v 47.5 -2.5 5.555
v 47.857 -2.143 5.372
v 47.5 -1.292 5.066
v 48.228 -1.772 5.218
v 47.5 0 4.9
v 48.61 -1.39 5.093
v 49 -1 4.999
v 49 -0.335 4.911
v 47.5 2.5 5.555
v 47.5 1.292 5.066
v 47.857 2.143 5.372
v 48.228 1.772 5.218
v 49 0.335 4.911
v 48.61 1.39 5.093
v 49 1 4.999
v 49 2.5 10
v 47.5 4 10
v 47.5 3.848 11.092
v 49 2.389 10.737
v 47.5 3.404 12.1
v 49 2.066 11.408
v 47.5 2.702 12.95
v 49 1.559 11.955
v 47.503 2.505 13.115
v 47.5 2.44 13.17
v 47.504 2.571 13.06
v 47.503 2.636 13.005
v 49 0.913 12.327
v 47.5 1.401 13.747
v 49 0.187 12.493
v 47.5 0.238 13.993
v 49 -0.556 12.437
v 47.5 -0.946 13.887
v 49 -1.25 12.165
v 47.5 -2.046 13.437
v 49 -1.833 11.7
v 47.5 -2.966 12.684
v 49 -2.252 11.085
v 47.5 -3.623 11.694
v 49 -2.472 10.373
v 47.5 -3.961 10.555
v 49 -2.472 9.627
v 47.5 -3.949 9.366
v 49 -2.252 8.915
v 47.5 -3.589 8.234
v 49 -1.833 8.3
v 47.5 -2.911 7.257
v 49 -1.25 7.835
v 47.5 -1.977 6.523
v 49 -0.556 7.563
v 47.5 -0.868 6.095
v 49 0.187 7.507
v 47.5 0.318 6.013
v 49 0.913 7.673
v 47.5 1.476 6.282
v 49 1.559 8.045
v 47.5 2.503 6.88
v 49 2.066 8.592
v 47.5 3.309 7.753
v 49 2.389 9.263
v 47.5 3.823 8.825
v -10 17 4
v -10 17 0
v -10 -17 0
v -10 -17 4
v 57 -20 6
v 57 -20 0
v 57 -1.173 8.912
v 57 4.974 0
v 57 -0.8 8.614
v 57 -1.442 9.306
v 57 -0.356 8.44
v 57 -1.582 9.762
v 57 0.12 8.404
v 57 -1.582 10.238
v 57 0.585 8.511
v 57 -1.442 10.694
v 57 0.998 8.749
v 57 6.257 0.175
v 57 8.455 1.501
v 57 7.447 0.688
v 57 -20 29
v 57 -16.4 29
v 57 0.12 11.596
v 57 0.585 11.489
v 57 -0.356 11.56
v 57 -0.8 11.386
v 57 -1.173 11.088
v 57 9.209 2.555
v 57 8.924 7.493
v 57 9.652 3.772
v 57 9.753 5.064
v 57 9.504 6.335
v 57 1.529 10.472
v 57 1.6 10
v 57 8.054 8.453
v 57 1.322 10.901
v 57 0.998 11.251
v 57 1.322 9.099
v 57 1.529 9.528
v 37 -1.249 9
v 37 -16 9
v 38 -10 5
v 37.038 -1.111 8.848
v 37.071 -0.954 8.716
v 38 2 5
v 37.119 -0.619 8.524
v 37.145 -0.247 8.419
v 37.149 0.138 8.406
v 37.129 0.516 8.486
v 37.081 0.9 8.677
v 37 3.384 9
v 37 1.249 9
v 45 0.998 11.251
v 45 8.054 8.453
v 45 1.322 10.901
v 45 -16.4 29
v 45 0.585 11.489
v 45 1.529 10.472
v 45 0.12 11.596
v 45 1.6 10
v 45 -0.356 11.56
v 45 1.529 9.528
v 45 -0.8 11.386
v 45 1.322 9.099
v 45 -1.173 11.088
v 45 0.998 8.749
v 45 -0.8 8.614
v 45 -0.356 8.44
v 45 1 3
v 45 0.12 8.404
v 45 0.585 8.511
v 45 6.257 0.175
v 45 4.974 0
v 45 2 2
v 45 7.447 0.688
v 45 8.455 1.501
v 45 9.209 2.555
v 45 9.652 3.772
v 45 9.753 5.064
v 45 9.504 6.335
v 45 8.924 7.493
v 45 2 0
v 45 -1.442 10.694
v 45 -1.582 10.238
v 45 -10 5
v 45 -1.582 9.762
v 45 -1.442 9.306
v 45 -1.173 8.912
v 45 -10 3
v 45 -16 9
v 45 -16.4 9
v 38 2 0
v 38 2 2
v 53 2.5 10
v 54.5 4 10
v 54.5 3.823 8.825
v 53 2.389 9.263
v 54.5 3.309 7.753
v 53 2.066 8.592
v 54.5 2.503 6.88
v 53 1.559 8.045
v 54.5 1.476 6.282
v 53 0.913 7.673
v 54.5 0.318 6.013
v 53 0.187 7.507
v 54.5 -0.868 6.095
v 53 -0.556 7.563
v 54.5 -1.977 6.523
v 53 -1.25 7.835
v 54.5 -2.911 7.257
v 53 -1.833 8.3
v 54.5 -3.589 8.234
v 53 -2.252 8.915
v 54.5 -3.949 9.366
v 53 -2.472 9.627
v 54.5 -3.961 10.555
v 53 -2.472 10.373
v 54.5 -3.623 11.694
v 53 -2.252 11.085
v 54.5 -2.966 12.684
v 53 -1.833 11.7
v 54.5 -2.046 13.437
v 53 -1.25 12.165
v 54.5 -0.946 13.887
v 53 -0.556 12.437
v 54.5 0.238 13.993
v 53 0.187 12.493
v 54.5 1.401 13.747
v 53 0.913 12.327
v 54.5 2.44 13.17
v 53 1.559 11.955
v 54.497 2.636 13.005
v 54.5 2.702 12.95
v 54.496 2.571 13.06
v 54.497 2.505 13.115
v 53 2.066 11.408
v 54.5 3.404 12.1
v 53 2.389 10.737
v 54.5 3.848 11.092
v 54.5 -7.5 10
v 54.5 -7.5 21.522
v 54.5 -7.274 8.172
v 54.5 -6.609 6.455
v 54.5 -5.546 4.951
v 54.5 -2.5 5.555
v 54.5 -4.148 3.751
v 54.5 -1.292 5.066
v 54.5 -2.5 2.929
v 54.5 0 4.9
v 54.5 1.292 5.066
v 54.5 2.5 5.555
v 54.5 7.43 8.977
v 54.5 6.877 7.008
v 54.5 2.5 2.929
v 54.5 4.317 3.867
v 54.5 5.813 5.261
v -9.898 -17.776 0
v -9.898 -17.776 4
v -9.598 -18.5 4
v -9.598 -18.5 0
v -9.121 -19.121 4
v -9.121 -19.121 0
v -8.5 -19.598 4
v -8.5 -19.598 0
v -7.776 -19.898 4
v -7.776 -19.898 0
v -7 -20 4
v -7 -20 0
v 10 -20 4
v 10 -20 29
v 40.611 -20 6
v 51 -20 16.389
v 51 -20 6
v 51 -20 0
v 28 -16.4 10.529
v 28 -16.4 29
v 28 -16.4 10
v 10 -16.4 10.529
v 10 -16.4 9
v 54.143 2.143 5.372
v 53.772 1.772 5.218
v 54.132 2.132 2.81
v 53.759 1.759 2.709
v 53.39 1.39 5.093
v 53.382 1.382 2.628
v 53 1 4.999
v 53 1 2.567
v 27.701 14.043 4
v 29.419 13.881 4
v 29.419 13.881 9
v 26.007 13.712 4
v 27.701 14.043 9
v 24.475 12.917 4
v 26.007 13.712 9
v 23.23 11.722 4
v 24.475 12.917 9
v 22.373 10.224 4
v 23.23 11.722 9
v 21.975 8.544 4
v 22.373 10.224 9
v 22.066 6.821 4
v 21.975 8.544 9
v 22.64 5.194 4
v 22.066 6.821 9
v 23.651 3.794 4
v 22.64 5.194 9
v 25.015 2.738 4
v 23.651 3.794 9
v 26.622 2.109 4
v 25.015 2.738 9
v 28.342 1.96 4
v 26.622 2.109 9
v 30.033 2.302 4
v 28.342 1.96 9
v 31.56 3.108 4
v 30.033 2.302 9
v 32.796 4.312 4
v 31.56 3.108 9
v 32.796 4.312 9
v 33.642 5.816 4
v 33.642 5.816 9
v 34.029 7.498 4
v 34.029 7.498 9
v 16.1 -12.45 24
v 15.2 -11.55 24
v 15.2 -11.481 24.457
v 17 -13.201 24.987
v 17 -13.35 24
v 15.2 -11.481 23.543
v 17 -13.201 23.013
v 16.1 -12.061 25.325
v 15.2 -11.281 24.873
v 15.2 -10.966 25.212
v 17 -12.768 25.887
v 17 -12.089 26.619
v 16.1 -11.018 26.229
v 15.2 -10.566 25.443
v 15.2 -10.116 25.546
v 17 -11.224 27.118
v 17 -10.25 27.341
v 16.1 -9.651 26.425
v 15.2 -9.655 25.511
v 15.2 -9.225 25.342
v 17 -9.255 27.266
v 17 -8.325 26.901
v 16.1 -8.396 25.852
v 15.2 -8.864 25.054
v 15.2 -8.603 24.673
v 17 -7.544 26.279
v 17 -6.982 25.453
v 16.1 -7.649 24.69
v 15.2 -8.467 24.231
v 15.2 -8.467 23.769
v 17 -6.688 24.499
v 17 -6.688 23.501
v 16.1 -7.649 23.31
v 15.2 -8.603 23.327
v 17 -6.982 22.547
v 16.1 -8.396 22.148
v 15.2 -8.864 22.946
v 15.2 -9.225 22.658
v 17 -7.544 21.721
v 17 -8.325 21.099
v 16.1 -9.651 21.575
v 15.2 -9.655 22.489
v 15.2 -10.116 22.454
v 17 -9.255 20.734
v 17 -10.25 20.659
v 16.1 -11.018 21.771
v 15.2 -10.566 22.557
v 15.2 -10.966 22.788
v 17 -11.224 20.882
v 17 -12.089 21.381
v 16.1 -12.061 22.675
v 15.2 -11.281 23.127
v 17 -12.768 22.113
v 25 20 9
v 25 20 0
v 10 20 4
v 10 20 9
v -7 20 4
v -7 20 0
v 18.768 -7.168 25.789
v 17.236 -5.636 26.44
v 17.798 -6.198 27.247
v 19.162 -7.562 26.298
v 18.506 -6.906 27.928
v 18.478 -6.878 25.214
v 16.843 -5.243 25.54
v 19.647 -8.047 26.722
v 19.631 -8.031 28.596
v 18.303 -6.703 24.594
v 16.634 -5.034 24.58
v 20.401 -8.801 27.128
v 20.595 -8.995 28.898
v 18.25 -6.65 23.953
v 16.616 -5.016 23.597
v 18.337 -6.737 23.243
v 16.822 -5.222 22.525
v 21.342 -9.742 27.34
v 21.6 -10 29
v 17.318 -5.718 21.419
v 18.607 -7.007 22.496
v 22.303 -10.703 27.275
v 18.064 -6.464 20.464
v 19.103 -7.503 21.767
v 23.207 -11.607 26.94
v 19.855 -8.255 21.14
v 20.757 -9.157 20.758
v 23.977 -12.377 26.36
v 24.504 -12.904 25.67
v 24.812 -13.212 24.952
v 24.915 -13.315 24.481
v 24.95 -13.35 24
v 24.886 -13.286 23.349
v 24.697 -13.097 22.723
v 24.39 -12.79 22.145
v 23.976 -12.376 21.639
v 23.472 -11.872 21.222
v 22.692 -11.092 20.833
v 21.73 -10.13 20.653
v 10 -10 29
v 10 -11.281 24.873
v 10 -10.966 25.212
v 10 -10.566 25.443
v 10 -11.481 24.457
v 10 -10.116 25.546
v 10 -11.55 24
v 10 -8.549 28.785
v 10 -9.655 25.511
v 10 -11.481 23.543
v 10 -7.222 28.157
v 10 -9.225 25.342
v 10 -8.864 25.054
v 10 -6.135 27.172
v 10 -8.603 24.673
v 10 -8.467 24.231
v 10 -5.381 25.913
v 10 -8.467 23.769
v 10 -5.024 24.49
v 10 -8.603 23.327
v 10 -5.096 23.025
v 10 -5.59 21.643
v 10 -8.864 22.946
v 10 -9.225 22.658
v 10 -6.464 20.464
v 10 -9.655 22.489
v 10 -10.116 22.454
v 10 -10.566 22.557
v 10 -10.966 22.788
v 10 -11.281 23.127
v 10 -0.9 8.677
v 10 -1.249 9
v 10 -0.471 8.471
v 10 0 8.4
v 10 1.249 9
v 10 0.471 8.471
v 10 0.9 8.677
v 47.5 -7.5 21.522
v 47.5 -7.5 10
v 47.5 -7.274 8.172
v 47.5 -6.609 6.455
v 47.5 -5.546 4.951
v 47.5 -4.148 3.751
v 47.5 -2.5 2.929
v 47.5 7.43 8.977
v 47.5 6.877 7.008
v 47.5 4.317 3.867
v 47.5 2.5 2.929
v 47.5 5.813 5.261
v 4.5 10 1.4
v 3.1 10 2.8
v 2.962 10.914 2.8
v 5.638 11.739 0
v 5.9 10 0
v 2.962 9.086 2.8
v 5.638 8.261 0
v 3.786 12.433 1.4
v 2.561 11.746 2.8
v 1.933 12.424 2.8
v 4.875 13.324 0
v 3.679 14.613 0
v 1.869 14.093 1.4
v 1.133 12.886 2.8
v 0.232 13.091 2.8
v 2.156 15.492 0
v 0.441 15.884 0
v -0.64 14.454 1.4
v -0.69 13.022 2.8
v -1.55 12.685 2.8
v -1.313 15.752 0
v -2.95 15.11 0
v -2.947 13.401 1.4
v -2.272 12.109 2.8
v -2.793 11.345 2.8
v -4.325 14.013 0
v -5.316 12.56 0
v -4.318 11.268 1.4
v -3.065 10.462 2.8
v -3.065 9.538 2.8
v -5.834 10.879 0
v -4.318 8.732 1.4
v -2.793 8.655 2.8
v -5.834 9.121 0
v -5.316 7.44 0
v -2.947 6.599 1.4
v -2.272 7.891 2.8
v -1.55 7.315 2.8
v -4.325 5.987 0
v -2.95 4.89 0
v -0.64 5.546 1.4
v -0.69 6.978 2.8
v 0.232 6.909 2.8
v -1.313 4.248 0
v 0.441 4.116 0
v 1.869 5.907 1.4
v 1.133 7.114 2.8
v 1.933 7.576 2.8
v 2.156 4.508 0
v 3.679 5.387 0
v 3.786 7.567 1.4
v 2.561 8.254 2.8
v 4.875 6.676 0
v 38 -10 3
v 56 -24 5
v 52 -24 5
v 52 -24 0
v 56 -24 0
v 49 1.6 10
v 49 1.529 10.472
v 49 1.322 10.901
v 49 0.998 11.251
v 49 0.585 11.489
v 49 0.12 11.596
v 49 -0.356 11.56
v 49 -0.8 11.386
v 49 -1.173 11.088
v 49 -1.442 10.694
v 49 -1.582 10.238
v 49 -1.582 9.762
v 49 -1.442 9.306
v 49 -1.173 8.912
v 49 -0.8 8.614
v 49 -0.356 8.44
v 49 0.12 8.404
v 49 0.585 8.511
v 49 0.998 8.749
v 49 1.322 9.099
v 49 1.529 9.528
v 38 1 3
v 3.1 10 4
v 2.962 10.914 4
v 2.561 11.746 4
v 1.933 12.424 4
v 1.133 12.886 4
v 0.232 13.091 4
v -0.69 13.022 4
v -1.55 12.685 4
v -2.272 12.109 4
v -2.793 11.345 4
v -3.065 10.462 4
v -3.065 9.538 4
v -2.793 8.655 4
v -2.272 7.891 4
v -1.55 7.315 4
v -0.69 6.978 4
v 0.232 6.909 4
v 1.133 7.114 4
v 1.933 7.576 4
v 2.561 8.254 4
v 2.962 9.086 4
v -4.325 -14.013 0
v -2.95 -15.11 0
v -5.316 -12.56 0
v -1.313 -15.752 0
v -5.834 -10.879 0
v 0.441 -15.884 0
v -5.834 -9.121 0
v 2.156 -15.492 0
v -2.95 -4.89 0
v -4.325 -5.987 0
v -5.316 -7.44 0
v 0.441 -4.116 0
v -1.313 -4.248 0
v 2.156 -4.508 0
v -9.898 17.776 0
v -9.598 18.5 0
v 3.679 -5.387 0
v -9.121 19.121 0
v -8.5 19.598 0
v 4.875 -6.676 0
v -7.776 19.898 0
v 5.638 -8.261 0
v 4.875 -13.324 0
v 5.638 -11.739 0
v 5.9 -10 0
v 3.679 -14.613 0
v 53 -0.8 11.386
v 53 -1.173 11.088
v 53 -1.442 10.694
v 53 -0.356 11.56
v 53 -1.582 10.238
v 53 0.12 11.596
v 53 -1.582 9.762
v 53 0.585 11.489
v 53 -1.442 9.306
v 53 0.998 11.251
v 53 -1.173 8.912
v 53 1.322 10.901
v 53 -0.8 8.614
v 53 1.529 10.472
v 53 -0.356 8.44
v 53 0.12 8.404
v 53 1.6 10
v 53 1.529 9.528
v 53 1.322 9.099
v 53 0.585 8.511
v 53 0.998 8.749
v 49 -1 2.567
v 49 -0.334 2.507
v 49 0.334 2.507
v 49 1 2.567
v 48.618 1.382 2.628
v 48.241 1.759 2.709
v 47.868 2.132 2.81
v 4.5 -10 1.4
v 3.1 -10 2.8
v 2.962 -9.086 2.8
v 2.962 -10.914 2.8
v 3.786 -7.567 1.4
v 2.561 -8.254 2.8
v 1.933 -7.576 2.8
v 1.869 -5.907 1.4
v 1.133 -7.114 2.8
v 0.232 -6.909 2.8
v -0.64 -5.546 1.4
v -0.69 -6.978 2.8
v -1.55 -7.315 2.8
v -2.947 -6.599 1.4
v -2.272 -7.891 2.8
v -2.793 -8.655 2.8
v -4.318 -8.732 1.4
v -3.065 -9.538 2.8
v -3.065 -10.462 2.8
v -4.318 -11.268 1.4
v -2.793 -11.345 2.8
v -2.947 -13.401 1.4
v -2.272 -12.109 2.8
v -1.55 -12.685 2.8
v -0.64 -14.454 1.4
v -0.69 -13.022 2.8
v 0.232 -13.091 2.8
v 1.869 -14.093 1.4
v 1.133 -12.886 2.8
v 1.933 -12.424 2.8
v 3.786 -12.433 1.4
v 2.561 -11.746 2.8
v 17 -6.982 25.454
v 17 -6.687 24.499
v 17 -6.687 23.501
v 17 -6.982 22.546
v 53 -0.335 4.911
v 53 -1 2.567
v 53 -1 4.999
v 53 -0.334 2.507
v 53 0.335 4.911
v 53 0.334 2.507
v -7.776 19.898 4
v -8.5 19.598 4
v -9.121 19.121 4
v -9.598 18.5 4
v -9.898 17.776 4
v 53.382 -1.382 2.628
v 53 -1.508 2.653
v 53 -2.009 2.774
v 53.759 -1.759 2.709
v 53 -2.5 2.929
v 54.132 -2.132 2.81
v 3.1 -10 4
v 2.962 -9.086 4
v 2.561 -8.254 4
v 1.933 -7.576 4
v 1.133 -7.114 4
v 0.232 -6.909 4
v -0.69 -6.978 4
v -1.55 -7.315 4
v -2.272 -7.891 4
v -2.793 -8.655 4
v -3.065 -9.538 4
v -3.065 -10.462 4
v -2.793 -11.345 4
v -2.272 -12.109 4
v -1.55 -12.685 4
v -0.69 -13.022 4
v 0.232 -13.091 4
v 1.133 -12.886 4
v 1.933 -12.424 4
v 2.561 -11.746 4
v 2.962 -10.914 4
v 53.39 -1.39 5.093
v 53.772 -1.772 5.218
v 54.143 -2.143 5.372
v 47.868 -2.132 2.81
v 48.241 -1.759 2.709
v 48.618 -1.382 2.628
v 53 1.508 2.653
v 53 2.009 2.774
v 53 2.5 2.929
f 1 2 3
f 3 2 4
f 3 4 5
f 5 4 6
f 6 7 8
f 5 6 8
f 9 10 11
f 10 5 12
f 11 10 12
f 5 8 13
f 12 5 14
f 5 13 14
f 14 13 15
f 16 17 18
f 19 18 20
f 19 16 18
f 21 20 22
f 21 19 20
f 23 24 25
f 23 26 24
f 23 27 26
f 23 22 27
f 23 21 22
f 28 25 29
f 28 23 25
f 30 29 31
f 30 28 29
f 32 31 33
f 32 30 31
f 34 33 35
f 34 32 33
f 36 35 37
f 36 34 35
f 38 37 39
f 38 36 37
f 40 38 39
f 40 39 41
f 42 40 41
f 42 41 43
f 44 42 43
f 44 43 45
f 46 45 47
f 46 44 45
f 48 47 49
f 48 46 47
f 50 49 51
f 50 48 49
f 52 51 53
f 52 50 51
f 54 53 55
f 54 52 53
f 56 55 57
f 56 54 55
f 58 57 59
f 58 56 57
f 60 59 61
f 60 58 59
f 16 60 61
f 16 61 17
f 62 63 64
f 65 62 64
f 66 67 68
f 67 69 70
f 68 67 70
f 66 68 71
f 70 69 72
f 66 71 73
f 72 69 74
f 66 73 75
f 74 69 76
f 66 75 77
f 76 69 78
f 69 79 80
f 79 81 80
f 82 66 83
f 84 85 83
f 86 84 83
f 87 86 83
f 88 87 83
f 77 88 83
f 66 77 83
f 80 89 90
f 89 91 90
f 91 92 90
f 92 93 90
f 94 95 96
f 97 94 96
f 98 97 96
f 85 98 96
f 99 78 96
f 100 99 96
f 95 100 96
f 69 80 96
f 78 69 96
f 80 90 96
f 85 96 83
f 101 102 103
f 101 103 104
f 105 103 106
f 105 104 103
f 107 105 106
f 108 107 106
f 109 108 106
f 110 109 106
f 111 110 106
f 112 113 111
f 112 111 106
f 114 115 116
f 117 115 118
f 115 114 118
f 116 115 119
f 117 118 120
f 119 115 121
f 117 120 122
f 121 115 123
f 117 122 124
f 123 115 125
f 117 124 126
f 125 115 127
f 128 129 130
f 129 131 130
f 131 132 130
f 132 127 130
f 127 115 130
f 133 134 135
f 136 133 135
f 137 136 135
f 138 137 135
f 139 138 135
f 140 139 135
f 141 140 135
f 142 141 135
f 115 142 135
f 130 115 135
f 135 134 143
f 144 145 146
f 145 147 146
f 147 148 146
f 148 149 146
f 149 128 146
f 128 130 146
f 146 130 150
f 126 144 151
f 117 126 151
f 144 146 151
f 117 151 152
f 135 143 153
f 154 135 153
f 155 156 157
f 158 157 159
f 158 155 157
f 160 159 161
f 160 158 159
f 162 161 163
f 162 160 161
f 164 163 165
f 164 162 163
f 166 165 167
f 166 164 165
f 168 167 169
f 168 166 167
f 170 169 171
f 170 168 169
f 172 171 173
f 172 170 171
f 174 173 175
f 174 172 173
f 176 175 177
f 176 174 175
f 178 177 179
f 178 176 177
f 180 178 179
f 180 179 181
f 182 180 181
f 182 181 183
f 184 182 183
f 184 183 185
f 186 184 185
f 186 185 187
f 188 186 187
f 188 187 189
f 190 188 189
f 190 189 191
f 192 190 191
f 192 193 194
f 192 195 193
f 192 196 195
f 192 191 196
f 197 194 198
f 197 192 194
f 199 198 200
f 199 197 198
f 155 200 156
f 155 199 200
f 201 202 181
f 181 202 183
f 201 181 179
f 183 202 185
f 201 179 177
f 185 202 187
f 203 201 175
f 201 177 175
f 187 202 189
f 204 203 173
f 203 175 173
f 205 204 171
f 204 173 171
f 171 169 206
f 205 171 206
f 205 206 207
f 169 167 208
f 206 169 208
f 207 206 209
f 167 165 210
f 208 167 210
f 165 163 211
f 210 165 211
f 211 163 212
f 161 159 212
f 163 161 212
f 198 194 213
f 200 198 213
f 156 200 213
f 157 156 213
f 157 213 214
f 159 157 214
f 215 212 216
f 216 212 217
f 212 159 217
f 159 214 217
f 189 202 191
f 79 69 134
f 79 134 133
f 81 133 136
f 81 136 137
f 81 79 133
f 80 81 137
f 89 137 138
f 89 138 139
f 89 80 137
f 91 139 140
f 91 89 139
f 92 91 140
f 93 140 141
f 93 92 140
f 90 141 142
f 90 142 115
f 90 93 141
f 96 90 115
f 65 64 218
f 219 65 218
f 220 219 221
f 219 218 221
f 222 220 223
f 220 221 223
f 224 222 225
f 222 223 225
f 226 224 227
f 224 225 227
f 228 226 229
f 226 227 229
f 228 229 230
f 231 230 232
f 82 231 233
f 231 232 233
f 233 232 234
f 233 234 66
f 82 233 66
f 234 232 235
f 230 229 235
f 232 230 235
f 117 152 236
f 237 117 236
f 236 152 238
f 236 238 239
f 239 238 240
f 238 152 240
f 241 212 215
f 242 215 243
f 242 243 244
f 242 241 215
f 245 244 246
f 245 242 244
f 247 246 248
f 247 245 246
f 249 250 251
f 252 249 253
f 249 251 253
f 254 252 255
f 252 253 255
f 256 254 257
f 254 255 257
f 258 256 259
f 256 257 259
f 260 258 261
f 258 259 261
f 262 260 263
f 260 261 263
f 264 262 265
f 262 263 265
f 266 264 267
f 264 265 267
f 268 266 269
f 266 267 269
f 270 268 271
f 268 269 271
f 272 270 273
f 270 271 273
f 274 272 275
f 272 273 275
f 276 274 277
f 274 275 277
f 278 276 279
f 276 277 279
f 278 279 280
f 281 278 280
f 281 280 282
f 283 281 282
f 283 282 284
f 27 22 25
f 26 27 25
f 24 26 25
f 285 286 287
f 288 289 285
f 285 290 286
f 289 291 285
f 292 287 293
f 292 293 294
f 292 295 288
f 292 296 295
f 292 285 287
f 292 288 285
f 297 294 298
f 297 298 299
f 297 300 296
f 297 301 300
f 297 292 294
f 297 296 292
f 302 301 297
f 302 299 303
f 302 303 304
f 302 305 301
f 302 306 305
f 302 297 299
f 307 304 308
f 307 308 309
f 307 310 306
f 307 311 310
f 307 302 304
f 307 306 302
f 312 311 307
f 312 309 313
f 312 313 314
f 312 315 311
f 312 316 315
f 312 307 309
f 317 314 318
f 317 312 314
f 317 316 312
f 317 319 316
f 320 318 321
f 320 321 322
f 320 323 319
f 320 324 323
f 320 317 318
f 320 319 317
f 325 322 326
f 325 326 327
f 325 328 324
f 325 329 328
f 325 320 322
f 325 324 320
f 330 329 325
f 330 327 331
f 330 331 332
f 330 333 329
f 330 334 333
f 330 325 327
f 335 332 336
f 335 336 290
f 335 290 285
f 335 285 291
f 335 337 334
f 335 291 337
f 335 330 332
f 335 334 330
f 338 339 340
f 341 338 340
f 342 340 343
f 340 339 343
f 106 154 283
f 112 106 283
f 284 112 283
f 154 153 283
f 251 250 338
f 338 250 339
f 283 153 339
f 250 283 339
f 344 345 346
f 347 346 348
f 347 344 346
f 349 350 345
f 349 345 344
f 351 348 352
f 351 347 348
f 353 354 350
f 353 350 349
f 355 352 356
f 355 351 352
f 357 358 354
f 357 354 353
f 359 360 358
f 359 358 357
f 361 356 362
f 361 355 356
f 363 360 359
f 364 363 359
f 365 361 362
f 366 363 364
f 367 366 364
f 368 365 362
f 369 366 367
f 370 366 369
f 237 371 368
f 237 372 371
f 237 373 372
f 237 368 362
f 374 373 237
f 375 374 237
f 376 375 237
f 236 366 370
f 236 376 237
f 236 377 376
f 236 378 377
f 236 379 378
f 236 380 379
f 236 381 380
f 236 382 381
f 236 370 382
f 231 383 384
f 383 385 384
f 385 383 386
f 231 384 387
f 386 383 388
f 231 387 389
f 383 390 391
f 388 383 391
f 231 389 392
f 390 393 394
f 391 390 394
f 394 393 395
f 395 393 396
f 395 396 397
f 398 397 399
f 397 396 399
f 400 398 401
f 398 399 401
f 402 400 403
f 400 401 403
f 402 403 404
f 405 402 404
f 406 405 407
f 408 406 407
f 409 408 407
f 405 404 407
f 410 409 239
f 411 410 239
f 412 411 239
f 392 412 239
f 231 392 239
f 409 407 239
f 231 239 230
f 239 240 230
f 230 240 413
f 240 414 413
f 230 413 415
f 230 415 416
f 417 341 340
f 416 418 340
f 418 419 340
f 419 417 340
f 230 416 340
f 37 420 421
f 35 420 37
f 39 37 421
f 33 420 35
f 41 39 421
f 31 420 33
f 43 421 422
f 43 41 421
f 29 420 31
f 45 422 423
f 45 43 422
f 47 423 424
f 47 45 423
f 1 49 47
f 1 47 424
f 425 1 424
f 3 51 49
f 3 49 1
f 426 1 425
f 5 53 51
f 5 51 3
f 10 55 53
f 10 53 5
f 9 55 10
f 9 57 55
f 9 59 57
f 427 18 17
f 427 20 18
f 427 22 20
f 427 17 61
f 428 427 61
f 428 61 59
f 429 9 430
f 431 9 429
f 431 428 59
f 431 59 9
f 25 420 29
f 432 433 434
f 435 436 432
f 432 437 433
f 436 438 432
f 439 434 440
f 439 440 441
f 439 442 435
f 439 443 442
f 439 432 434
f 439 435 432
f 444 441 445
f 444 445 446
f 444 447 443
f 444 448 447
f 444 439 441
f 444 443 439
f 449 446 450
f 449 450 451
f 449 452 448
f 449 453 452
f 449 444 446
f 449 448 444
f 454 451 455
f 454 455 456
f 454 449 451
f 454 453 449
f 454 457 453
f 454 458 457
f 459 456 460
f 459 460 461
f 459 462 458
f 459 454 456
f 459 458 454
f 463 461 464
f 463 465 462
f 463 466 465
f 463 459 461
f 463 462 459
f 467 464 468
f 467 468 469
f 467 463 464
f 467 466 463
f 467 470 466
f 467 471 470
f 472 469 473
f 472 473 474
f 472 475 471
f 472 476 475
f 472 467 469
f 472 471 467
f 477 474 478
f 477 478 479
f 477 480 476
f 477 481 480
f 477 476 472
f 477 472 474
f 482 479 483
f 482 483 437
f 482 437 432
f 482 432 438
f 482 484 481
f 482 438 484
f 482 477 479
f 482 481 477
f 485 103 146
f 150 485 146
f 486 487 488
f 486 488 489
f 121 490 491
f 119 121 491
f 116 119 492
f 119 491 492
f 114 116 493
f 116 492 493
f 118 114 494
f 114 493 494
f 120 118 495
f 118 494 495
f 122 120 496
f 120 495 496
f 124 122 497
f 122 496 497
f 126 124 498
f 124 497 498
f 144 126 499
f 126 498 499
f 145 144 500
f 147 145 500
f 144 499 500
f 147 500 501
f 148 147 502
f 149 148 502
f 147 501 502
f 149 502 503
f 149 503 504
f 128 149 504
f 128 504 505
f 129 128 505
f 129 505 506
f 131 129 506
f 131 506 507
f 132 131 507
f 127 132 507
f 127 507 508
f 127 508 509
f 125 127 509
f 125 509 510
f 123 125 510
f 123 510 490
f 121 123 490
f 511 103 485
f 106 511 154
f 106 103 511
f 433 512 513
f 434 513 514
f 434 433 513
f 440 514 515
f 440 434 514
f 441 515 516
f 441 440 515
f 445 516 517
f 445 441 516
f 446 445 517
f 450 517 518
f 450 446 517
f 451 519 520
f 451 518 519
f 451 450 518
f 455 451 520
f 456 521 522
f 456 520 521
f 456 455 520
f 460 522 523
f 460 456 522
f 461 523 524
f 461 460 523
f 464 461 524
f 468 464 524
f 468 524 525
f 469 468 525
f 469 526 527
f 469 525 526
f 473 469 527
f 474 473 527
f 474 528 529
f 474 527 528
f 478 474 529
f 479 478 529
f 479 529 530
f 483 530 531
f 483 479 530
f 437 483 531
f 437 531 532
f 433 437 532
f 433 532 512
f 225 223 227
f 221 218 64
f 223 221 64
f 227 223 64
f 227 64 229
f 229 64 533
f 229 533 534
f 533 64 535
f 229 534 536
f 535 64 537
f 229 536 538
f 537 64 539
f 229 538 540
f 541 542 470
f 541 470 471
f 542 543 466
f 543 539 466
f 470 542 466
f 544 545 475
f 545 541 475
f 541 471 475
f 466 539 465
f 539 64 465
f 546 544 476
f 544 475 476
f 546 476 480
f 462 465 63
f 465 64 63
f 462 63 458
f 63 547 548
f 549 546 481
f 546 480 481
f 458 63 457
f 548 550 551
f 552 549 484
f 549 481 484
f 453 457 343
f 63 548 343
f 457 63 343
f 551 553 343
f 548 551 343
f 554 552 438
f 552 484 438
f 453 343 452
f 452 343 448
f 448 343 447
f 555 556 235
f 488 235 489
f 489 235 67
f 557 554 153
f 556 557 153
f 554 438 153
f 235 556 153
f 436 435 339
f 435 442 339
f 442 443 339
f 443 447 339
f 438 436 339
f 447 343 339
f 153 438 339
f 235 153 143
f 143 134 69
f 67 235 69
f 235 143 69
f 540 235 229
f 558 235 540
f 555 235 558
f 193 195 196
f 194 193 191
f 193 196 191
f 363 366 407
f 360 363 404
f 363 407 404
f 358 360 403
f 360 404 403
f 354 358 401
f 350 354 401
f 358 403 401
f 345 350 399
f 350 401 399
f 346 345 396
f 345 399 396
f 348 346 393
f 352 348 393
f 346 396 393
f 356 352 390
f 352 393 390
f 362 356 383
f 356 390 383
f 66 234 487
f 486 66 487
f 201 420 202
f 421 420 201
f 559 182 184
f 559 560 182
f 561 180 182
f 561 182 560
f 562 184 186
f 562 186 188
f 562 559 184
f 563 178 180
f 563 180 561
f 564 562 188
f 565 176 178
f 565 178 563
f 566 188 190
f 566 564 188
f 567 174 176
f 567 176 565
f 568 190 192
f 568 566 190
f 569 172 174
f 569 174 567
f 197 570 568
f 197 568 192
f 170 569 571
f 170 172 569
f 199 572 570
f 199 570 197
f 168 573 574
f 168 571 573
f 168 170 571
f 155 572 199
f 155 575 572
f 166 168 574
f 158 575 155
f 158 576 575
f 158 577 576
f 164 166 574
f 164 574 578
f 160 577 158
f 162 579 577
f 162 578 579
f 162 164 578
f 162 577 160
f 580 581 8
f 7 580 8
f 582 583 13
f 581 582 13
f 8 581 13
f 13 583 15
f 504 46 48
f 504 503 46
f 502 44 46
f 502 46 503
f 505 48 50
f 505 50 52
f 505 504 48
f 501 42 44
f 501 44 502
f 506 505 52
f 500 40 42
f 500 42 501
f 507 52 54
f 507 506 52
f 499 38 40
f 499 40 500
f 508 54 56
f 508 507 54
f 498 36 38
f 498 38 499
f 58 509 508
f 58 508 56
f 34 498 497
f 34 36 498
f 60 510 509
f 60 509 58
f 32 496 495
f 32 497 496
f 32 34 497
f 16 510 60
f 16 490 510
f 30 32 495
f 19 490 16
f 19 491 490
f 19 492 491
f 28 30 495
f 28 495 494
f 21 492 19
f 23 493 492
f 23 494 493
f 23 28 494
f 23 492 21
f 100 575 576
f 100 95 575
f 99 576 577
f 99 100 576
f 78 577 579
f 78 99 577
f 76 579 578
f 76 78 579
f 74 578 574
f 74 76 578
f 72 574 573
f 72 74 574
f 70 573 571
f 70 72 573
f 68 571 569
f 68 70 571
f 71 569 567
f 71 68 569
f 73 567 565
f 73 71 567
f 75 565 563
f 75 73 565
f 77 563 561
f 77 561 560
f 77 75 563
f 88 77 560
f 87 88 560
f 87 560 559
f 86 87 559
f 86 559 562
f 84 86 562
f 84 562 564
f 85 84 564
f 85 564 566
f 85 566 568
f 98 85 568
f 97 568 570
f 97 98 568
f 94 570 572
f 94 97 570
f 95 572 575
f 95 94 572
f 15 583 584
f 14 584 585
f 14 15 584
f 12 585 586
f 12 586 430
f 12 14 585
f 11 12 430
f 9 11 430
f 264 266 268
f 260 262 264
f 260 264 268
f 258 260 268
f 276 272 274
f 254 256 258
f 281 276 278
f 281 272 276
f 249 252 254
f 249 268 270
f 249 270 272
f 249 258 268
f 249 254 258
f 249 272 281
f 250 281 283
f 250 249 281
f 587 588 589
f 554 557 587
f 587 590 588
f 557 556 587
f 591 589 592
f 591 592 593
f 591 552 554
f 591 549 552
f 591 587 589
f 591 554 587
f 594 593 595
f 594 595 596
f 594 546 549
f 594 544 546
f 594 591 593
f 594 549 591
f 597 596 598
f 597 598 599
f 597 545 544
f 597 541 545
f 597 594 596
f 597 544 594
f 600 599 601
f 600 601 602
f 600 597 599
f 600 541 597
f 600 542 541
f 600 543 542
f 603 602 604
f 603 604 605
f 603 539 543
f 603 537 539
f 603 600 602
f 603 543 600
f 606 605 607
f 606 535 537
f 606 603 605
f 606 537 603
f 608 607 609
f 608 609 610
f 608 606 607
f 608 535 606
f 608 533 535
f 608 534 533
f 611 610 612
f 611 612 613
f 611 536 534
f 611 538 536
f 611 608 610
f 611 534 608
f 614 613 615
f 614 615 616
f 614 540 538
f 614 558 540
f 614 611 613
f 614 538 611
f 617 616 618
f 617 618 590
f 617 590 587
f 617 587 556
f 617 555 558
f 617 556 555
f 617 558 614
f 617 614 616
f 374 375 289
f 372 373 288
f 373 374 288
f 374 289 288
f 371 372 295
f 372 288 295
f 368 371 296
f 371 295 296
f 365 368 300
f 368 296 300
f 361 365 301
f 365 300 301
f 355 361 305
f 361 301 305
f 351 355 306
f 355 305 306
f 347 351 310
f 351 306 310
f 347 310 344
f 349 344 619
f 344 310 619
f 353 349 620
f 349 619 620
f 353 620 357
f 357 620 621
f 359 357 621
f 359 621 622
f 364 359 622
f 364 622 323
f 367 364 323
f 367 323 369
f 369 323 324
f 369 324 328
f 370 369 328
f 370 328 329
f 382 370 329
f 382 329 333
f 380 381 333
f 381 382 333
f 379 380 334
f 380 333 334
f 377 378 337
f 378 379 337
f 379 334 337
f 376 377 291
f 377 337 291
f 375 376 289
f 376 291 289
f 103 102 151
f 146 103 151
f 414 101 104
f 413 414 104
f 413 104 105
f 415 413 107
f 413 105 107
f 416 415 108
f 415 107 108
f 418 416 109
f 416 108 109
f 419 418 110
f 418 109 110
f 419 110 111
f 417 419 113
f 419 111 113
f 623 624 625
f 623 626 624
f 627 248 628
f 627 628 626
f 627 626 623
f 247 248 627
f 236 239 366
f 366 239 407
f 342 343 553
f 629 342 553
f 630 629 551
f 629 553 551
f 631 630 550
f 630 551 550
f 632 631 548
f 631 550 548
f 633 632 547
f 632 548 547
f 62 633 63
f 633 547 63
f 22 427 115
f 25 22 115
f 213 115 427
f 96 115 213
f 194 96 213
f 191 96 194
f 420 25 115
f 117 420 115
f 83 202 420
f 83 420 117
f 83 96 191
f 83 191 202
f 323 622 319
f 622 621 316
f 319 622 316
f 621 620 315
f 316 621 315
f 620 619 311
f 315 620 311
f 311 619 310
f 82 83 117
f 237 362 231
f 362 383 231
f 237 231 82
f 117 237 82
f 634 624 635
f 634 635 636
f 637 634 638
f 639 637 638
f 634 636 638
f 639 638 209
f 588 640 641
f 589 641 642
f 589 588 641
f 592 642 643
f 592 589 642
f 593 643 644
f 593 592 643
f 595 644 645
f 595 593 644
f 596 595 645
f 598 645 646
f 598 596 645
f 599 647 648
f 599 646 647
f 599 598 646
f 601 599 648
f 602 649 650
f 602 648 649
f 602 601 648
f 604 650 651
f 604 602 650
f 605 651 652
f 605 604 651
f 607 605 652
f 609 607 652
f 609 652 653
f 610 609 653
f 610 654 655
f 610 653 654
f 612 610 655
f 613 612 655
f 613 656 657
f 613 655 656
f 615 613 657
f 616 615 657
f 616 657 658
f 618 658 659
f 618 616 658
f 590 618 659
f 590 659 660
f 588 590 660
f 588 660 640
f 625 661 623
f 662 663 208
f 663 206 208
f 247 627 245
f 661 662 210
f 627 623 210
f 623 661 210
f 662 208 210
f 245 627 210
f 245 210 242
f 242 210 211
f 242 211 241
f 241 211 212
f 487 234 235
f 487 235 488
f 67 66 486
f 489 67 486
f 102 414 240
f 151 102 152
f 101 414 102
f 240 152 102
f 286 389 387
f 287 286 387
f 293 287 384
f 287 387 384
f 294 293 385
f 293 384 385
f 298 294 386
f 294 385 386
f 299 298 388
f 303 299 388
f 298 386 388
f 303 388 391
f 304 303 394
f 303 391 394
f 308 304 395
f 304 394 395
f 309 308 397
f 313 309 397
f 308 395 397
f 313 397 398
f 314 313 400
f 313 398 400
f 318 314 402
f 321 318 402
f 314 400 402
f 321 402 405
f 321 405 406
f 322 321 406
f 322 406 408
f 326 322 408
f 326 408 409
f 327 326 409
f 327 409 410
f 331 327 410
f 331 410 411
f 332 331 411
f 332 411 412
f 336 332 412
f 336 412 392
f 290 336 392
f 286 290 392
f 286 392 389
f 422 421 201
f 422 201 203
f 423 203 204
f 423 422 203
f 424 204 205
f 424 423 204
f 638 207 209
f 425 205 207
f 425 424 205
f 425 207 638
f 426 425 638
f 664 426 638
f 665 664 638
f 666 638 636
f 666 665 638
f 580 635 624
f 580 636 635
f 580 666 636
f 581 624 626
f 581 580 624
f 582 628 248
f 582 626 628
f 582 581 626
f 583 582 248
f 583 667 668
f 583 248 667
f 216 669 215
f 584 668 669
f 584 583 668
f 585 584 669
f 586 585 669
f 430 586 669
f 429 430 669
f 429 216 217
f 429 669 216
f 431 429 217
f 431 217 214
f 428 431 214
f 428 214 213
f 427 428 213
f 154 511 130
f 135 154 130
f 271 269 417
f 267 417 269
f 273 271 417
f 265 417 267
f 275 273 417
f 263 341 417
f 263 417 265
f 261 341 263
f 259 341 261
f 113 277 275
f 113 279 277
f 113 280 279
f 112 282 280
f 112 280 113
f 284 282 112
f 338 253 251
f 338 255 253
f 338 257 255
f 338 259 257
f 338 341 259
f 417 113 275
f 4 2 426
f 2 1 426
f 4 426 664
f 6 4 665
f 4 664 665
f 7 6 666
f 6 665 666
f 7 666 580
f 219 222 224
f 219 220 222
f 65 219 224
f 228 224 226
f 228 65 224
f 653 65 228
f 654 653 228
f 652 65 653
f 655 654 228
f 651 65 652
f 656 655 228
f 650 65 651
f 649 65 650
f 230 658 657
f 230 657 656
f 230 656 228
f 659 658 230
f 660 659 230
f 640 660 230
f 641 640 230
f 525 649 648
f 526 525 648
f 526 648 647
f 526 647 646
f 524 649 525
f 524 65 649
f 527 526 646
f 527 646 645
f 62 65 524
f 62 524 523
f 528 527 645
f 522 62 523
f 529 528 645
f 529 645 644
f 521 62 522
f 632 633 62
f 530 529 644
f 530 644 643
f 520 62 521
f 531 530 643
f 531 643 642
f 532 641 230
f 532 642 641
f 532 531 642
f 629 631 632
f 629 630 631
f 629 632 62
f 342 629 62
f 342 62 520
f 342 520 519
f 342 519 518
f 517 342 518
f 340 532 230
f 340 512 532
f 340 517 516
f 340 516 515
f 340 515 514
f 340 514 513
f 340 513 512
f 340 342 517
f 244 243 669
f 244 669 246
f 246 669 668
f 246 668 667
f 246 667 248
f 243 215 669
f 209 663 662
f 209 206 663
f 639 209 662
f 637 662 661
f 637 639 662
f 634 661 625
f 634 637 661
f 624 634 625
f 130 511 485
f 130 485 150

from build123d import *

# Parameters (mm, degrees)
SKETCH1_R               = 3.1
BOSS_EXTRUDE1_DEPTH     = 9
SKETCH2_W               = 20
SKETCH2_H               = 40
CUT_EXTRUDE1_DEPTH      = 5
SKETCH3_R               = 6.05
CUT_EXTRUDE2_DEPTH      = 5
BOSS_EXTRUDE2_DEPTH     = 20
CUT_EXTRUDE4_REACH      = 77.697
SKETCH6_R               = 1.6
CUT_EXTRUDE3_DEPTH      = 3.5
CUT_EXTRUDE3_DEPTH_BACK = 3.5
SKETCH11_W              = 7
SKETCH11_H              = 12
CUT_EXTRUDE9_DEPTH      = 6
CHAMFER3_SIZE           = 6
CHAMFER3_SIZE2          = 4
CHAMFER4_SIZE           = 1
BOSS_EXTRUDE3_START     = 1.5
SKETCH12_R              = 2.5
SKETCH12_R_2            = 1.6
BOSS_EXTRUDE3_DEPTH     = 1.5
SKETCH13_R              = 2.5
SKETCH13_R_2            = 1.6
BOSS_EXTRUDE4_DEPTH     = 1.5
CHAMFER6_SIZE           = 1.5
SKETCH14_W              = 6
SKETCH14_H              = 6
BOSS_EXTRUDE5_DEPTH     = 4
CHAMFER7_SIZE           = 4
CHAMFER7_SIZE_2         = 1
CHAMFER8_SIZE2          = 1
CHAMFER8_SIZE           = 4
CHAMFER9_SIZE           = 2.8
BOSS_EXTRUDE6_DEPTH     = 6
CHAMFER10_START         = 16
CHAMFER10_DEPTH         = 0.6
CHAMFER10_START_2       = 16.6
CHAMFER10_2_DEPTH       = 11.4
CHAMFER10_START_3       = 10
CHAMFER10_3_DEPTH       = 19
CUT_EXTRUDE10_REACH     = 62.216
SKETCH16_R              = 1.55
CUT_EXTRUDE11_REACH     = 69.216
CUT_EXTRUDE11_START     = -7
SKETCH17_R              = 3.35
CHAMFER11_SIZE          = 1.8


with BuildPart() as part:
    # Sketch1 → Boss-Extrude1 (new body)
    with BuildSketch(Plane.XY):
        with BuildLine():
            Line((-10, 17), (-10, -17))
            ThreePointArc((-10, -17), (-9.121320344, -19.121320344), (-7, -20))
            Line((-7, -20), (57, -20))
            Line((57, -20), (57, 20))
            Line((57, 20), (45, 20))
            Line((45, 20), (45, 2))
            Line((45, 2), (38, 2))
            Line((38, 2), (25, 20))
            Line((25, 20), (10, 20))
            Line((10, 20), (-7, 20))
            ThreePointArc((-7, 20), (-9.121320344, 19.121320344), (-10, 17))
        make_face()
        with Locations((0, 10)):
            Circle(SKETCH1_R, mode=Mode.SUBTRACT)
        with Locations((0, -10)):
            Circle(SKETCH1_R, mode=Mode.SUBTRACT)
    extrude(amount=BOSS_EXTRUDE1_DEPTH)

    # Sketch2 → Cut-Extrude1 (cut)
    with BuildSketch(Plane.XY.offset(9)):
        Rectangle(SKETCH2_W, SKETCH2_H)
    extrude(amount=-CUT_EXTRUDE1_DEPTH, mode=Mode.SUBTRACT)

    # Sketch3 → Cut-Extrude2 (cut)
    with BuildSketch(Plane.XY.offset(9)):
        with Locations((28, 8)):
            Circle(SKETCH3_R)
    extrude(amount=-CUT_EXTRUDE2_DEPTH, mode=Mode.SUBTRACT)

    # Sketch4 → Boss-Extrude2 (add)
    with BuildSketch(Plane.XY.offset(9)):
        Polygon((57, -20), (57, 20), (45, 20), (45, -16.4), (10, -16.4), (10, -20), align=None)
    extrude(amount=BOSS_EXTRUDE2_DEPTH)

    # Sketch6 → Cut-Extrude4 (cut, up to next)
    with BuildSketch(Plane(origin=(57, 0, 0), x_dir=(0, 0, -1), z_dir=(1, 0, 0)), mode=Mode.PRIVATE) as cut_extrude4_sk1:
        with Locations(Location((-10, 0, 0), (0, 0, 90))):
            Circle(SKETCH6_R)
    cut_extrude4_tool1 = extrude(cut_extrude4_sk1.sketch, amount=-CUT_EXTRUDE4_REACH, mode=Mode.PRIVATE) & part.part
    # Sketch6 → Cut-Extrude4 (cut, up to next)
    with BuildSketch(Plane(origin=(57, 0, 0), x_dir=(0, 0, -1), z_dir=(1, 0, 0)), mode=Mode.PRIVATE) as cut_extrude4_sk2:
        with BuildLine():
            Line((-8.452703128, 8.053653381), (-29, -16.4))
            Line((-29, -16.4), (-29, 20))
            Line((-29, 20), (0, 20))
            Line((0, 20), (0, 4.973878308))
            ThreePointArc((0, 4.973878308), (-3.148499311, 9.472022499), (-8.452703128, 8.053653381))
        make_face()
    cut_extrude4_tool2 = extrude(cut_extrude4_sk2.sketch, amount=-CUT_EXTRUDE4_REACH, mode=Mode.PRIVATE) & part.part
    add(cut_extrude4_tool1.solids().sort_by_distance((57, 0, 10))[0], mode=Mode.SUBTRACT)
    add(cut_extrude4_tool2.solids().sort_by_distance((57, 8.078553, 17.874396))[0], mode=Mode.SUBTRACT)

    # Sketch5 → Cut-Extrude3 (cut, two sides: drawn at the far end of the back side and taken through both)
    with BuildSketch(Plane(origin=(51, 0, 0), x_dir=(0, 0, -1), z_dir=(1, 0, 0)).offset(-CUT_EXTRUDE3_DEPTH_BACK)):
        with BuildLine():
            Line((-10, 7.5), (-29, 7.5))
            Line((-29, 7.5), (-29, -7.5))
            Line((-29, -7.5), (-10, -7.5))
            ThreePointArc((-10, -7.5), (-2.5, 0), (-10, 7.5))
        make_face()
    extrude(amount=CUT_EXTRUDE3_DEPTH + CUT_EXTRUDE3_DEPTH_BACK, mode=Mode.SUBTRACT)

    # Sketch11 → Cut-Extrude9 (cut)
    with BuildSketch(Plane.XY.offset(9)):
        with Locations((41.5, -4)):
            Rectangle(SKETCH11_W, SKETCH11_H)
    extrude(amount=-CUT_EXTRUDE9_DEPTH, mode=Mode.SUBTRACT)

    # Chamfer3
    chamfer3_edges = [part.edges().sort_by_distance(p)[0] for p in [
        (41.5, -10, 9),
    ]]
    chamfer3_side = [part.faces().sort_by_distance(p)[0] for p in [
        (25.671541958, -9.242433067, 9),
    ]]
    chamfer(chamfer3_edges, length=CHAMFER3_SIZE, length2=CHAMFER3_SIZE2, reference=chamfer3_side[0])

    # Chamfer4
    chamfer4_edges = [part.edges().sort_by_distance(p)[0] for p in [
        (41.5, 2, 3),
    ]]
    chamfer(chamfer4_edges, length=CHAMFER4_SIZE)

    # Sketch12 → Boss-Extrude3 (add)
    # profile 1 of 2: a face of its own
    with BuildSketch(Plane(origin=(47.5, 0, 0), x_dir=(0, 0, -1), z_dir=(1, 0, 0)).offset(BOSS_EXTRUDE3_START)):
        with Locations(Location((-10, 0, 0), (0, 0, 90))):
            Circle(SKETCH12_R)
        with Locations(Location((-10, 0, 0), (0, 0, 90))):
            Circle(SKETCH12_R_2, mode=Mode.SUBTRACT)
    # profile 2 of 2: a face of its own
    with BuildSketch(Plane(origin=(47.5, 0, 0), x_dir=(0, 0, -1), z_dir=(1, 0, 0)).offset(BOSS_EXTRUDE3_START)):
        with BuildLine():
            Line((-5.554777846, 2.5), (-2.822197066, 2.5))
            ThreePointArc((-2.822197066, 2.5), (-2.399285891, 0), (-2.822197066, -2.5))
            Line((-2.822197066, -2.5), (-5.554777846, -2.5))
            ThreePointArc((-5.554777846, -2.5), (-4.9, 0), (-5.554777846, 2.5))
        make_face()
    extrude(amount=-BOSS_EXTRUDE3_DEPTH)

    # Sketch13 → Boss-Extrude4 (add)
    # profile 1 of 2: a face of its own
    with BuildSketch(Plane.ZY.offset(-54.5)):
        with Locations(Location((10, 0, 0), (0, 0, 90))):
            Circle(SKETCH13_R)
        with Locations(Location((10, 0, 0), (0, 0, 90))):
            Circle(SKETCH13_R_2, mode=Mode.SUBTRACT)
    # profile 2 of 2: a face of its own
    with BuildSketch(Plane.ZY.offset(-54.5)):
        with BuildLine():
            Line((5.554777846, 2.5), (2.928932188, 2.5))
            ThreePointArc((2.928932188, 2.5), (2.5, 0), (2.928932188, -2.5))
            Line((2.928932188, -2.5), (5.554777846, -2.5))
            ThreePointArc((5.554777846, -2.5), (4.9, 0), (5.554777846, 2.5))
        make_face()
    extrude(amount=BOSS_EXTRUDE4_DEPTH)

    # Chamfer6
    # the kernel refuses this chamfer: 1.5 mm, written as the material it adds along each edge
    with BuildSketch(Plane(origin=(54.5, 0, 10), x_dir=(0, 1, 0), z_dir=(0, 0, 1))) as chamfer6_piece_1_section:
        Polygon((2.5 + CHAMFER6_SIZE, 0), (2.5, CHAMFER6_SIZE), (2.5, 0), align=None)
    chamfer6_piece_1 = revolve(axis=Axis((54.5, 0, 10), (-1, 0, 0)), mode=Mode.PRIVATE)
    chamfer6_piece_1 = split(chamfer6_piece_1, bisect_by=Plane(origin=(54.5, 2.570872815, 13.059635197), z_dir=(0, -0.6433064031075088, -0.7656088242182685)), keep=Keep.TOP, mode=Mode.PRIVATE)
    add(chamfer6_piece_1)
    with BuildSketch(Plane(origin=(47.5, 0, 10), x_dir=(0, 1, 0), z_dir=(0, 0, -1))) as chamfer6_piece_2_section:
        Polygon((2.5 + CHAMFER6_SIZE, 0), (2.5, CHAMFER6_SIZE), (2.5, 0), align=None)
    chamfer6_piece_2 = revolve(axis=Axis((47.5, 0, 10), (1, 0, 0)), mode=Mode.PRIVATE)
    chamfer6_piece_2 = split(chamfer6_piece_2, bisect_by=Plane(origin=(47.5, 2.570872815, 13.059635197), z_dir=(0, -0.6433064031075088, -0.7656088242182685)), keep=Keep.TOP, mode=Mode.PRIVATE)
    add(chamfer6_piece_2)
    # the kernel refuses this chamfer: 1.5 mm, written as the material it takes off along each edge
    with BuildSketch(Plane(origin=(49, -2.5, -0.928592294), x_dir=(-1, 0, 0), z_dir=(0, 0, 1))) as chamfer6_2_piece_1_section:
        Polygon((CHAMFER6_SIZE, 0), (0, -CHAMFER6_SIZE), (0, 0), align=None)
    chamfer6_2_piece_1 = extrude(amount=10.340894622, mode=Mode.PRIVATE)
    chamfer6_2_piece_1 = chamfer6_2_piece_1 & Plane(origin=(49, 0, 10), x_dir=(0, -1, 0), z_dir=(-1, 0, 0)) * Cylinder(7.5, 27, mode=Mode.PRIVATE)
    chamfer6_2_piece_1 = chamfer6_2_piece_1 - Plane(origin=(49, 0, 10), x_dir=(0, -0.49019607843137236, -0.8716121870938381), z_dir=(1, 0, 0)) * Cylinder(5.1, 27, mode=Mode.PRIVATE)
    add(chamfer6_2_piece_1, mode=Mode.SUBTRACT)
    with BuildSketch(Plane(origin=(49, 2.5, 9.412302328), x_dir=(0, -1, 0), z_dir=(0, 0, -1))) as chamfer6_2_piece_2_section:
        Polygon((CHAMFER6_SIZE, 0), (0, CHAMFER6_SIZE), (0, 0), align=None)
    chamfer6_2_piece_2 = extrude(amount=10.340894622, mode=Mode.PRIVATE)
    chamfer6_2_piece_2 = chamfer6_2_piece_2 & Plane(origin=(49, 0, 10), x_dir=(0, -1, 0), z_dir=(-1, 0, 0)) * Cylinder(7.5, 27, mode=Mode.PRIVATE)
    chamfer6_2_piece_2 = chamfer6_2_piece_2 - Plane(origin=(49, 0, 10), x_dir=(0, -0.49019607843137236, -0.8716121870938381), z_dir=(1, 0, 0)) * Cylinder(5.1, 27, mode=Mode.PRIVATE)
    add(chamfer6_2_piece_2, mode=Mode.SUBTRACT)
    with BuildSketch(Plane(origin=(53, -2.5, -0.928592294), x_dir=(1, 0, 0), z_dir=(0, 0, 1))) as chamfer6_2_piece_3_section:
        Polygon((CHAMFER6_SIZE, 0), (0, CHAMFER6_SIZE), (0, 0), align=None)
    chamfer6_2_piece_3 = extrude(amount=10.340894622, mode=Mode.PRIVATE)
    chamfer6_2_piece_3 = chamfer6_2_piece_3 & Plane(origin=(53, 0, 10), x_dir=(0, -1, 0), z_dir=(-1, 0, 0)) * Cylinder(7.5, 27, mode=Mode.PRIVATE)
    chamfer6_2_piece_3 = chamfer6_2_piece_3 - Plane(origin=(53, 0, 10), x_dir=(0, -0.4901960784313735, -0.8716121870938375), z_dir=(1, 0, 0)) * Cylinder(5.1, 27, mode=Mode.PRIVATE)
    add(chamfer6_2_piece_3, mode=Mode.SUBTRACT)
    with BuildSketch(Plane(origin=(53, 2.5, 9.412302328), x_dir=(1, 0, 0), z_dir=(0, 0, -1))) as chamfer6_2_piece_4_section:
        Polygon((CHAMFER6_SIZE, 0), (0, CHAMFER6_SIZE), (0, 0), align=None)
    chamfer6_2_piece_4 = extrude(amount=10.340894622, mode=Mode.PRIVATE)
    chamfer6_2_piece_4 = chamfer6_2_piece_4 & Plane(origin=(53, 0, 10), x_dir=(0, -1, 0), z_dir=(-1, 0, 0)) * Cylinder(7.5, 27, mode=Mode.PRIVATE)
    chamfer6_2_piece_4 = chamfer6_2_piece_4 - Plane(origin=(53, 0, 10), x_dir=(0, -0.4901960784313735, -0.8716121870938375), z_dir=(1, 0, 0)) * Cylinder(5.1, 27, mode=Mode.PRIVATE)
    add(chamfer6_2_piece_4, mode=Mode.SUBTRACT)

    # Sketch14 → Boss-Extrude5 (add)
    with BuildSketch(Plane.XZ.offset(20)):
        with Locations((54, 3)):
            Rectangle(SKETCH14_W, SKETCH14_H)
    extrude(amount=BOSS_EXTRUDE5_DEPTH)

    # Chamfer7
    # the kernel refuses this chamfer: 4, 1 mm, written as the material it takes off along each edge
    with BuildSketch(Plane(origin=(40.611490001, -24, 6), x_dir=(0, 1, 0), z_dir=(1, 0, 0)), Plane(origin=(51, -24, -10.388509999), x_dir=(0, 1, 0), z_dir=(0, 0, 1)), Plane(origin=(57, -24, 16.388509999), x_dir=(0, 1, 0), z_dir=(0, 0, -1))) as chamfer7_piece_1:
        Polygon((CHAMFER7_SIZE, 0), (0, -CHAMFER7_SIZE_2), (0, 0), align=None)
    extrude(amount=26.777019998, mode=Mode.SUBTRACT)

    # Chamfer8
    chamfer8_edges = [part.edges().sort_by_distance(p)[0] for p in [
        (38, -8.6244998, 9),
    ]]
    chamfer8_side = [part.faces().sort_by_distance(p)[0] for p in [
        (38, -8.6244998, 8.98),
    ]]
    chamfer(chamfer8_edges, length=CHAMFER8_SIZE - 0.0001, length2=CHAMFER8_SIZE2 - 0.0001, reference=chamfer8_side[0])  # a hair under: the kernel refuses the full size

    # Chamfer9
    chamfer9_edges = [part.edges().sort_by_distance(p)[0] for p in [
        (-3.1, 10, 0),
        (-3.1, -10, 0),
    ]]
    chamfer(chamfer9_edges, length=CHAMFER9_SIZE)

    # Sketch15 → Boss-Extrude6 (add)
    with BuildSketch(Plane.ZY.offset(-10)):
        with BuildLine():
            Line((29, -10), (29, -16.4))
            Line((29, -16.4), (10.528932188, -16.4))
            Line((10.528932188, -16.4), (20.464466094, -6.464466094))
            ThreePointArc((20.464466094, -6.464466094), (25.913417162, -5.380602337), (29, -10))
        make_face()
    extrude(amount=-BOSS_EXTRUDE6_DEPTH)

    # Chamfer10: read off the stored shape, not the designer's step
    # Chamfer10 outline → Chamfer10 (add)
    with BuildSketch(Plane.YZ.offset(CHAMFER10_START)):
        with BuildLine():
            ThreePointArc((-6.464466094, 20.464466094), (-5.380602337, 25.913417162), (-10, 29))
            Line((-10, 29), (-16.4, 29))
            Line((-16.4, 29), (-16.4, 10.528932188))
            Line((-16.4, 10.528932188), (-6.464466094, 20.464466094))
        make_face()
    extrude(amount=CHAMFER10_DEPTH)

    # Chamfer10 2 outline → Chamfer10 2 (add)
    with BuildSketch(Plane.YZ.offset(CHAMFER10_START_2)):
        with BuildLine():
            ThreePointArc((-6.464466094, 20.464466094), (-5.380602337, 25.913417162), (-10, 29))
            Line((-10, 29), (-16.4, 29))
            Line((-16.4, 29), (-16.4, 10.528932188))
            Line((-16.4, 10.528932188), (-6.464466094, 20.464466094))
        make_face()
    extrude(amount=CHAMFER10_2_DEPTH)

    # Chamfer10 3 outline → Chamfer10 3 (cut)
    with BuildSketch(Plane.XY.offset(CHAMFER10_START_3)):
        Polygon((15, -3.4), (28, -16.4), (28, -3), (15, -3), align=None)
    extrude(amount=CHAMFER10_3_DEPTH, mode=Mode.SUBTRACT)

    # Cut-Extrude10: up to this plane
    cut_extrude10_end = Plane(origin=(28, -16.4, 29), z_dir=(0.7071067811865438, 0.7071067811865513, 0))
    # Sketch16 → Cut-Extrude10 (cut, up to the surface)
    with BuildSketch(Plane.ZY.offset(-10), mode=Mode.PRIVATE) as cut_extrude10_sk1:
        with Locations(Location((24, -10, 0), (0, 0, 270))):
            Circle(SKETCH16_R)
    cut_extrude10_tool1 = split(extrude(cut_extrude10_sk1.sketch, amount=-CUT_EXTRUDE10_REACH, mode=Mode.PRIVATE), bisect_by=cut_extrude10_end, keep=Keep.BOTH, mode=Mode.PRIVATE)
    add(cut_extrude10_tool1.solids().sort_by_distance((10, -10, 24))[0], mode=Mode.SUBTRACT)

    # Cut-Extrude11: up to this plane
    cut_extrude11_end = Plane(origin=(28, -16.4, 29), z_dir=(0.7071067811865438, 0.7071067811865513, 0))
    # Sketch17 → Cut-Extrude11 (cut, up to the surface)
    with BuildSketch(Plane.ZY.offset(-10).offset(CUT_EXTRUDE11_START), mode=Mode.PRIVATE) as cut_extrude11_sk1:
        with Locations(Location((24, -10, 0), (0, 0, 270))):
            Circle(SKETCH17_R)
    cut_extrude11_tool1 = split(extrude(cut_extrude11_sk1.sketch, amount=-CUT_EXTRUDE11_REACH, mode=Mode.PRIVATE), bisect_by=cut_extrude11_end, keep=Keep.BOTH, mode=Mode.PRIVATE)
    add(cut_extrude11_tool1.solids().sort_by_distance((17, -10, 24))[0], mode=Mode.SUBTRACT)

    # Chamfer11
    chamfer11_edges = [part.edges().sort_by_distance(p)[0] for p in [
        (17, -8.45, 24),
    ]]
    chamfer(chamfer11_edges, length=CHAMFER11_SIZE - 0.0001)  # a hair under: the kernel refuses the full size


solid = part.part
